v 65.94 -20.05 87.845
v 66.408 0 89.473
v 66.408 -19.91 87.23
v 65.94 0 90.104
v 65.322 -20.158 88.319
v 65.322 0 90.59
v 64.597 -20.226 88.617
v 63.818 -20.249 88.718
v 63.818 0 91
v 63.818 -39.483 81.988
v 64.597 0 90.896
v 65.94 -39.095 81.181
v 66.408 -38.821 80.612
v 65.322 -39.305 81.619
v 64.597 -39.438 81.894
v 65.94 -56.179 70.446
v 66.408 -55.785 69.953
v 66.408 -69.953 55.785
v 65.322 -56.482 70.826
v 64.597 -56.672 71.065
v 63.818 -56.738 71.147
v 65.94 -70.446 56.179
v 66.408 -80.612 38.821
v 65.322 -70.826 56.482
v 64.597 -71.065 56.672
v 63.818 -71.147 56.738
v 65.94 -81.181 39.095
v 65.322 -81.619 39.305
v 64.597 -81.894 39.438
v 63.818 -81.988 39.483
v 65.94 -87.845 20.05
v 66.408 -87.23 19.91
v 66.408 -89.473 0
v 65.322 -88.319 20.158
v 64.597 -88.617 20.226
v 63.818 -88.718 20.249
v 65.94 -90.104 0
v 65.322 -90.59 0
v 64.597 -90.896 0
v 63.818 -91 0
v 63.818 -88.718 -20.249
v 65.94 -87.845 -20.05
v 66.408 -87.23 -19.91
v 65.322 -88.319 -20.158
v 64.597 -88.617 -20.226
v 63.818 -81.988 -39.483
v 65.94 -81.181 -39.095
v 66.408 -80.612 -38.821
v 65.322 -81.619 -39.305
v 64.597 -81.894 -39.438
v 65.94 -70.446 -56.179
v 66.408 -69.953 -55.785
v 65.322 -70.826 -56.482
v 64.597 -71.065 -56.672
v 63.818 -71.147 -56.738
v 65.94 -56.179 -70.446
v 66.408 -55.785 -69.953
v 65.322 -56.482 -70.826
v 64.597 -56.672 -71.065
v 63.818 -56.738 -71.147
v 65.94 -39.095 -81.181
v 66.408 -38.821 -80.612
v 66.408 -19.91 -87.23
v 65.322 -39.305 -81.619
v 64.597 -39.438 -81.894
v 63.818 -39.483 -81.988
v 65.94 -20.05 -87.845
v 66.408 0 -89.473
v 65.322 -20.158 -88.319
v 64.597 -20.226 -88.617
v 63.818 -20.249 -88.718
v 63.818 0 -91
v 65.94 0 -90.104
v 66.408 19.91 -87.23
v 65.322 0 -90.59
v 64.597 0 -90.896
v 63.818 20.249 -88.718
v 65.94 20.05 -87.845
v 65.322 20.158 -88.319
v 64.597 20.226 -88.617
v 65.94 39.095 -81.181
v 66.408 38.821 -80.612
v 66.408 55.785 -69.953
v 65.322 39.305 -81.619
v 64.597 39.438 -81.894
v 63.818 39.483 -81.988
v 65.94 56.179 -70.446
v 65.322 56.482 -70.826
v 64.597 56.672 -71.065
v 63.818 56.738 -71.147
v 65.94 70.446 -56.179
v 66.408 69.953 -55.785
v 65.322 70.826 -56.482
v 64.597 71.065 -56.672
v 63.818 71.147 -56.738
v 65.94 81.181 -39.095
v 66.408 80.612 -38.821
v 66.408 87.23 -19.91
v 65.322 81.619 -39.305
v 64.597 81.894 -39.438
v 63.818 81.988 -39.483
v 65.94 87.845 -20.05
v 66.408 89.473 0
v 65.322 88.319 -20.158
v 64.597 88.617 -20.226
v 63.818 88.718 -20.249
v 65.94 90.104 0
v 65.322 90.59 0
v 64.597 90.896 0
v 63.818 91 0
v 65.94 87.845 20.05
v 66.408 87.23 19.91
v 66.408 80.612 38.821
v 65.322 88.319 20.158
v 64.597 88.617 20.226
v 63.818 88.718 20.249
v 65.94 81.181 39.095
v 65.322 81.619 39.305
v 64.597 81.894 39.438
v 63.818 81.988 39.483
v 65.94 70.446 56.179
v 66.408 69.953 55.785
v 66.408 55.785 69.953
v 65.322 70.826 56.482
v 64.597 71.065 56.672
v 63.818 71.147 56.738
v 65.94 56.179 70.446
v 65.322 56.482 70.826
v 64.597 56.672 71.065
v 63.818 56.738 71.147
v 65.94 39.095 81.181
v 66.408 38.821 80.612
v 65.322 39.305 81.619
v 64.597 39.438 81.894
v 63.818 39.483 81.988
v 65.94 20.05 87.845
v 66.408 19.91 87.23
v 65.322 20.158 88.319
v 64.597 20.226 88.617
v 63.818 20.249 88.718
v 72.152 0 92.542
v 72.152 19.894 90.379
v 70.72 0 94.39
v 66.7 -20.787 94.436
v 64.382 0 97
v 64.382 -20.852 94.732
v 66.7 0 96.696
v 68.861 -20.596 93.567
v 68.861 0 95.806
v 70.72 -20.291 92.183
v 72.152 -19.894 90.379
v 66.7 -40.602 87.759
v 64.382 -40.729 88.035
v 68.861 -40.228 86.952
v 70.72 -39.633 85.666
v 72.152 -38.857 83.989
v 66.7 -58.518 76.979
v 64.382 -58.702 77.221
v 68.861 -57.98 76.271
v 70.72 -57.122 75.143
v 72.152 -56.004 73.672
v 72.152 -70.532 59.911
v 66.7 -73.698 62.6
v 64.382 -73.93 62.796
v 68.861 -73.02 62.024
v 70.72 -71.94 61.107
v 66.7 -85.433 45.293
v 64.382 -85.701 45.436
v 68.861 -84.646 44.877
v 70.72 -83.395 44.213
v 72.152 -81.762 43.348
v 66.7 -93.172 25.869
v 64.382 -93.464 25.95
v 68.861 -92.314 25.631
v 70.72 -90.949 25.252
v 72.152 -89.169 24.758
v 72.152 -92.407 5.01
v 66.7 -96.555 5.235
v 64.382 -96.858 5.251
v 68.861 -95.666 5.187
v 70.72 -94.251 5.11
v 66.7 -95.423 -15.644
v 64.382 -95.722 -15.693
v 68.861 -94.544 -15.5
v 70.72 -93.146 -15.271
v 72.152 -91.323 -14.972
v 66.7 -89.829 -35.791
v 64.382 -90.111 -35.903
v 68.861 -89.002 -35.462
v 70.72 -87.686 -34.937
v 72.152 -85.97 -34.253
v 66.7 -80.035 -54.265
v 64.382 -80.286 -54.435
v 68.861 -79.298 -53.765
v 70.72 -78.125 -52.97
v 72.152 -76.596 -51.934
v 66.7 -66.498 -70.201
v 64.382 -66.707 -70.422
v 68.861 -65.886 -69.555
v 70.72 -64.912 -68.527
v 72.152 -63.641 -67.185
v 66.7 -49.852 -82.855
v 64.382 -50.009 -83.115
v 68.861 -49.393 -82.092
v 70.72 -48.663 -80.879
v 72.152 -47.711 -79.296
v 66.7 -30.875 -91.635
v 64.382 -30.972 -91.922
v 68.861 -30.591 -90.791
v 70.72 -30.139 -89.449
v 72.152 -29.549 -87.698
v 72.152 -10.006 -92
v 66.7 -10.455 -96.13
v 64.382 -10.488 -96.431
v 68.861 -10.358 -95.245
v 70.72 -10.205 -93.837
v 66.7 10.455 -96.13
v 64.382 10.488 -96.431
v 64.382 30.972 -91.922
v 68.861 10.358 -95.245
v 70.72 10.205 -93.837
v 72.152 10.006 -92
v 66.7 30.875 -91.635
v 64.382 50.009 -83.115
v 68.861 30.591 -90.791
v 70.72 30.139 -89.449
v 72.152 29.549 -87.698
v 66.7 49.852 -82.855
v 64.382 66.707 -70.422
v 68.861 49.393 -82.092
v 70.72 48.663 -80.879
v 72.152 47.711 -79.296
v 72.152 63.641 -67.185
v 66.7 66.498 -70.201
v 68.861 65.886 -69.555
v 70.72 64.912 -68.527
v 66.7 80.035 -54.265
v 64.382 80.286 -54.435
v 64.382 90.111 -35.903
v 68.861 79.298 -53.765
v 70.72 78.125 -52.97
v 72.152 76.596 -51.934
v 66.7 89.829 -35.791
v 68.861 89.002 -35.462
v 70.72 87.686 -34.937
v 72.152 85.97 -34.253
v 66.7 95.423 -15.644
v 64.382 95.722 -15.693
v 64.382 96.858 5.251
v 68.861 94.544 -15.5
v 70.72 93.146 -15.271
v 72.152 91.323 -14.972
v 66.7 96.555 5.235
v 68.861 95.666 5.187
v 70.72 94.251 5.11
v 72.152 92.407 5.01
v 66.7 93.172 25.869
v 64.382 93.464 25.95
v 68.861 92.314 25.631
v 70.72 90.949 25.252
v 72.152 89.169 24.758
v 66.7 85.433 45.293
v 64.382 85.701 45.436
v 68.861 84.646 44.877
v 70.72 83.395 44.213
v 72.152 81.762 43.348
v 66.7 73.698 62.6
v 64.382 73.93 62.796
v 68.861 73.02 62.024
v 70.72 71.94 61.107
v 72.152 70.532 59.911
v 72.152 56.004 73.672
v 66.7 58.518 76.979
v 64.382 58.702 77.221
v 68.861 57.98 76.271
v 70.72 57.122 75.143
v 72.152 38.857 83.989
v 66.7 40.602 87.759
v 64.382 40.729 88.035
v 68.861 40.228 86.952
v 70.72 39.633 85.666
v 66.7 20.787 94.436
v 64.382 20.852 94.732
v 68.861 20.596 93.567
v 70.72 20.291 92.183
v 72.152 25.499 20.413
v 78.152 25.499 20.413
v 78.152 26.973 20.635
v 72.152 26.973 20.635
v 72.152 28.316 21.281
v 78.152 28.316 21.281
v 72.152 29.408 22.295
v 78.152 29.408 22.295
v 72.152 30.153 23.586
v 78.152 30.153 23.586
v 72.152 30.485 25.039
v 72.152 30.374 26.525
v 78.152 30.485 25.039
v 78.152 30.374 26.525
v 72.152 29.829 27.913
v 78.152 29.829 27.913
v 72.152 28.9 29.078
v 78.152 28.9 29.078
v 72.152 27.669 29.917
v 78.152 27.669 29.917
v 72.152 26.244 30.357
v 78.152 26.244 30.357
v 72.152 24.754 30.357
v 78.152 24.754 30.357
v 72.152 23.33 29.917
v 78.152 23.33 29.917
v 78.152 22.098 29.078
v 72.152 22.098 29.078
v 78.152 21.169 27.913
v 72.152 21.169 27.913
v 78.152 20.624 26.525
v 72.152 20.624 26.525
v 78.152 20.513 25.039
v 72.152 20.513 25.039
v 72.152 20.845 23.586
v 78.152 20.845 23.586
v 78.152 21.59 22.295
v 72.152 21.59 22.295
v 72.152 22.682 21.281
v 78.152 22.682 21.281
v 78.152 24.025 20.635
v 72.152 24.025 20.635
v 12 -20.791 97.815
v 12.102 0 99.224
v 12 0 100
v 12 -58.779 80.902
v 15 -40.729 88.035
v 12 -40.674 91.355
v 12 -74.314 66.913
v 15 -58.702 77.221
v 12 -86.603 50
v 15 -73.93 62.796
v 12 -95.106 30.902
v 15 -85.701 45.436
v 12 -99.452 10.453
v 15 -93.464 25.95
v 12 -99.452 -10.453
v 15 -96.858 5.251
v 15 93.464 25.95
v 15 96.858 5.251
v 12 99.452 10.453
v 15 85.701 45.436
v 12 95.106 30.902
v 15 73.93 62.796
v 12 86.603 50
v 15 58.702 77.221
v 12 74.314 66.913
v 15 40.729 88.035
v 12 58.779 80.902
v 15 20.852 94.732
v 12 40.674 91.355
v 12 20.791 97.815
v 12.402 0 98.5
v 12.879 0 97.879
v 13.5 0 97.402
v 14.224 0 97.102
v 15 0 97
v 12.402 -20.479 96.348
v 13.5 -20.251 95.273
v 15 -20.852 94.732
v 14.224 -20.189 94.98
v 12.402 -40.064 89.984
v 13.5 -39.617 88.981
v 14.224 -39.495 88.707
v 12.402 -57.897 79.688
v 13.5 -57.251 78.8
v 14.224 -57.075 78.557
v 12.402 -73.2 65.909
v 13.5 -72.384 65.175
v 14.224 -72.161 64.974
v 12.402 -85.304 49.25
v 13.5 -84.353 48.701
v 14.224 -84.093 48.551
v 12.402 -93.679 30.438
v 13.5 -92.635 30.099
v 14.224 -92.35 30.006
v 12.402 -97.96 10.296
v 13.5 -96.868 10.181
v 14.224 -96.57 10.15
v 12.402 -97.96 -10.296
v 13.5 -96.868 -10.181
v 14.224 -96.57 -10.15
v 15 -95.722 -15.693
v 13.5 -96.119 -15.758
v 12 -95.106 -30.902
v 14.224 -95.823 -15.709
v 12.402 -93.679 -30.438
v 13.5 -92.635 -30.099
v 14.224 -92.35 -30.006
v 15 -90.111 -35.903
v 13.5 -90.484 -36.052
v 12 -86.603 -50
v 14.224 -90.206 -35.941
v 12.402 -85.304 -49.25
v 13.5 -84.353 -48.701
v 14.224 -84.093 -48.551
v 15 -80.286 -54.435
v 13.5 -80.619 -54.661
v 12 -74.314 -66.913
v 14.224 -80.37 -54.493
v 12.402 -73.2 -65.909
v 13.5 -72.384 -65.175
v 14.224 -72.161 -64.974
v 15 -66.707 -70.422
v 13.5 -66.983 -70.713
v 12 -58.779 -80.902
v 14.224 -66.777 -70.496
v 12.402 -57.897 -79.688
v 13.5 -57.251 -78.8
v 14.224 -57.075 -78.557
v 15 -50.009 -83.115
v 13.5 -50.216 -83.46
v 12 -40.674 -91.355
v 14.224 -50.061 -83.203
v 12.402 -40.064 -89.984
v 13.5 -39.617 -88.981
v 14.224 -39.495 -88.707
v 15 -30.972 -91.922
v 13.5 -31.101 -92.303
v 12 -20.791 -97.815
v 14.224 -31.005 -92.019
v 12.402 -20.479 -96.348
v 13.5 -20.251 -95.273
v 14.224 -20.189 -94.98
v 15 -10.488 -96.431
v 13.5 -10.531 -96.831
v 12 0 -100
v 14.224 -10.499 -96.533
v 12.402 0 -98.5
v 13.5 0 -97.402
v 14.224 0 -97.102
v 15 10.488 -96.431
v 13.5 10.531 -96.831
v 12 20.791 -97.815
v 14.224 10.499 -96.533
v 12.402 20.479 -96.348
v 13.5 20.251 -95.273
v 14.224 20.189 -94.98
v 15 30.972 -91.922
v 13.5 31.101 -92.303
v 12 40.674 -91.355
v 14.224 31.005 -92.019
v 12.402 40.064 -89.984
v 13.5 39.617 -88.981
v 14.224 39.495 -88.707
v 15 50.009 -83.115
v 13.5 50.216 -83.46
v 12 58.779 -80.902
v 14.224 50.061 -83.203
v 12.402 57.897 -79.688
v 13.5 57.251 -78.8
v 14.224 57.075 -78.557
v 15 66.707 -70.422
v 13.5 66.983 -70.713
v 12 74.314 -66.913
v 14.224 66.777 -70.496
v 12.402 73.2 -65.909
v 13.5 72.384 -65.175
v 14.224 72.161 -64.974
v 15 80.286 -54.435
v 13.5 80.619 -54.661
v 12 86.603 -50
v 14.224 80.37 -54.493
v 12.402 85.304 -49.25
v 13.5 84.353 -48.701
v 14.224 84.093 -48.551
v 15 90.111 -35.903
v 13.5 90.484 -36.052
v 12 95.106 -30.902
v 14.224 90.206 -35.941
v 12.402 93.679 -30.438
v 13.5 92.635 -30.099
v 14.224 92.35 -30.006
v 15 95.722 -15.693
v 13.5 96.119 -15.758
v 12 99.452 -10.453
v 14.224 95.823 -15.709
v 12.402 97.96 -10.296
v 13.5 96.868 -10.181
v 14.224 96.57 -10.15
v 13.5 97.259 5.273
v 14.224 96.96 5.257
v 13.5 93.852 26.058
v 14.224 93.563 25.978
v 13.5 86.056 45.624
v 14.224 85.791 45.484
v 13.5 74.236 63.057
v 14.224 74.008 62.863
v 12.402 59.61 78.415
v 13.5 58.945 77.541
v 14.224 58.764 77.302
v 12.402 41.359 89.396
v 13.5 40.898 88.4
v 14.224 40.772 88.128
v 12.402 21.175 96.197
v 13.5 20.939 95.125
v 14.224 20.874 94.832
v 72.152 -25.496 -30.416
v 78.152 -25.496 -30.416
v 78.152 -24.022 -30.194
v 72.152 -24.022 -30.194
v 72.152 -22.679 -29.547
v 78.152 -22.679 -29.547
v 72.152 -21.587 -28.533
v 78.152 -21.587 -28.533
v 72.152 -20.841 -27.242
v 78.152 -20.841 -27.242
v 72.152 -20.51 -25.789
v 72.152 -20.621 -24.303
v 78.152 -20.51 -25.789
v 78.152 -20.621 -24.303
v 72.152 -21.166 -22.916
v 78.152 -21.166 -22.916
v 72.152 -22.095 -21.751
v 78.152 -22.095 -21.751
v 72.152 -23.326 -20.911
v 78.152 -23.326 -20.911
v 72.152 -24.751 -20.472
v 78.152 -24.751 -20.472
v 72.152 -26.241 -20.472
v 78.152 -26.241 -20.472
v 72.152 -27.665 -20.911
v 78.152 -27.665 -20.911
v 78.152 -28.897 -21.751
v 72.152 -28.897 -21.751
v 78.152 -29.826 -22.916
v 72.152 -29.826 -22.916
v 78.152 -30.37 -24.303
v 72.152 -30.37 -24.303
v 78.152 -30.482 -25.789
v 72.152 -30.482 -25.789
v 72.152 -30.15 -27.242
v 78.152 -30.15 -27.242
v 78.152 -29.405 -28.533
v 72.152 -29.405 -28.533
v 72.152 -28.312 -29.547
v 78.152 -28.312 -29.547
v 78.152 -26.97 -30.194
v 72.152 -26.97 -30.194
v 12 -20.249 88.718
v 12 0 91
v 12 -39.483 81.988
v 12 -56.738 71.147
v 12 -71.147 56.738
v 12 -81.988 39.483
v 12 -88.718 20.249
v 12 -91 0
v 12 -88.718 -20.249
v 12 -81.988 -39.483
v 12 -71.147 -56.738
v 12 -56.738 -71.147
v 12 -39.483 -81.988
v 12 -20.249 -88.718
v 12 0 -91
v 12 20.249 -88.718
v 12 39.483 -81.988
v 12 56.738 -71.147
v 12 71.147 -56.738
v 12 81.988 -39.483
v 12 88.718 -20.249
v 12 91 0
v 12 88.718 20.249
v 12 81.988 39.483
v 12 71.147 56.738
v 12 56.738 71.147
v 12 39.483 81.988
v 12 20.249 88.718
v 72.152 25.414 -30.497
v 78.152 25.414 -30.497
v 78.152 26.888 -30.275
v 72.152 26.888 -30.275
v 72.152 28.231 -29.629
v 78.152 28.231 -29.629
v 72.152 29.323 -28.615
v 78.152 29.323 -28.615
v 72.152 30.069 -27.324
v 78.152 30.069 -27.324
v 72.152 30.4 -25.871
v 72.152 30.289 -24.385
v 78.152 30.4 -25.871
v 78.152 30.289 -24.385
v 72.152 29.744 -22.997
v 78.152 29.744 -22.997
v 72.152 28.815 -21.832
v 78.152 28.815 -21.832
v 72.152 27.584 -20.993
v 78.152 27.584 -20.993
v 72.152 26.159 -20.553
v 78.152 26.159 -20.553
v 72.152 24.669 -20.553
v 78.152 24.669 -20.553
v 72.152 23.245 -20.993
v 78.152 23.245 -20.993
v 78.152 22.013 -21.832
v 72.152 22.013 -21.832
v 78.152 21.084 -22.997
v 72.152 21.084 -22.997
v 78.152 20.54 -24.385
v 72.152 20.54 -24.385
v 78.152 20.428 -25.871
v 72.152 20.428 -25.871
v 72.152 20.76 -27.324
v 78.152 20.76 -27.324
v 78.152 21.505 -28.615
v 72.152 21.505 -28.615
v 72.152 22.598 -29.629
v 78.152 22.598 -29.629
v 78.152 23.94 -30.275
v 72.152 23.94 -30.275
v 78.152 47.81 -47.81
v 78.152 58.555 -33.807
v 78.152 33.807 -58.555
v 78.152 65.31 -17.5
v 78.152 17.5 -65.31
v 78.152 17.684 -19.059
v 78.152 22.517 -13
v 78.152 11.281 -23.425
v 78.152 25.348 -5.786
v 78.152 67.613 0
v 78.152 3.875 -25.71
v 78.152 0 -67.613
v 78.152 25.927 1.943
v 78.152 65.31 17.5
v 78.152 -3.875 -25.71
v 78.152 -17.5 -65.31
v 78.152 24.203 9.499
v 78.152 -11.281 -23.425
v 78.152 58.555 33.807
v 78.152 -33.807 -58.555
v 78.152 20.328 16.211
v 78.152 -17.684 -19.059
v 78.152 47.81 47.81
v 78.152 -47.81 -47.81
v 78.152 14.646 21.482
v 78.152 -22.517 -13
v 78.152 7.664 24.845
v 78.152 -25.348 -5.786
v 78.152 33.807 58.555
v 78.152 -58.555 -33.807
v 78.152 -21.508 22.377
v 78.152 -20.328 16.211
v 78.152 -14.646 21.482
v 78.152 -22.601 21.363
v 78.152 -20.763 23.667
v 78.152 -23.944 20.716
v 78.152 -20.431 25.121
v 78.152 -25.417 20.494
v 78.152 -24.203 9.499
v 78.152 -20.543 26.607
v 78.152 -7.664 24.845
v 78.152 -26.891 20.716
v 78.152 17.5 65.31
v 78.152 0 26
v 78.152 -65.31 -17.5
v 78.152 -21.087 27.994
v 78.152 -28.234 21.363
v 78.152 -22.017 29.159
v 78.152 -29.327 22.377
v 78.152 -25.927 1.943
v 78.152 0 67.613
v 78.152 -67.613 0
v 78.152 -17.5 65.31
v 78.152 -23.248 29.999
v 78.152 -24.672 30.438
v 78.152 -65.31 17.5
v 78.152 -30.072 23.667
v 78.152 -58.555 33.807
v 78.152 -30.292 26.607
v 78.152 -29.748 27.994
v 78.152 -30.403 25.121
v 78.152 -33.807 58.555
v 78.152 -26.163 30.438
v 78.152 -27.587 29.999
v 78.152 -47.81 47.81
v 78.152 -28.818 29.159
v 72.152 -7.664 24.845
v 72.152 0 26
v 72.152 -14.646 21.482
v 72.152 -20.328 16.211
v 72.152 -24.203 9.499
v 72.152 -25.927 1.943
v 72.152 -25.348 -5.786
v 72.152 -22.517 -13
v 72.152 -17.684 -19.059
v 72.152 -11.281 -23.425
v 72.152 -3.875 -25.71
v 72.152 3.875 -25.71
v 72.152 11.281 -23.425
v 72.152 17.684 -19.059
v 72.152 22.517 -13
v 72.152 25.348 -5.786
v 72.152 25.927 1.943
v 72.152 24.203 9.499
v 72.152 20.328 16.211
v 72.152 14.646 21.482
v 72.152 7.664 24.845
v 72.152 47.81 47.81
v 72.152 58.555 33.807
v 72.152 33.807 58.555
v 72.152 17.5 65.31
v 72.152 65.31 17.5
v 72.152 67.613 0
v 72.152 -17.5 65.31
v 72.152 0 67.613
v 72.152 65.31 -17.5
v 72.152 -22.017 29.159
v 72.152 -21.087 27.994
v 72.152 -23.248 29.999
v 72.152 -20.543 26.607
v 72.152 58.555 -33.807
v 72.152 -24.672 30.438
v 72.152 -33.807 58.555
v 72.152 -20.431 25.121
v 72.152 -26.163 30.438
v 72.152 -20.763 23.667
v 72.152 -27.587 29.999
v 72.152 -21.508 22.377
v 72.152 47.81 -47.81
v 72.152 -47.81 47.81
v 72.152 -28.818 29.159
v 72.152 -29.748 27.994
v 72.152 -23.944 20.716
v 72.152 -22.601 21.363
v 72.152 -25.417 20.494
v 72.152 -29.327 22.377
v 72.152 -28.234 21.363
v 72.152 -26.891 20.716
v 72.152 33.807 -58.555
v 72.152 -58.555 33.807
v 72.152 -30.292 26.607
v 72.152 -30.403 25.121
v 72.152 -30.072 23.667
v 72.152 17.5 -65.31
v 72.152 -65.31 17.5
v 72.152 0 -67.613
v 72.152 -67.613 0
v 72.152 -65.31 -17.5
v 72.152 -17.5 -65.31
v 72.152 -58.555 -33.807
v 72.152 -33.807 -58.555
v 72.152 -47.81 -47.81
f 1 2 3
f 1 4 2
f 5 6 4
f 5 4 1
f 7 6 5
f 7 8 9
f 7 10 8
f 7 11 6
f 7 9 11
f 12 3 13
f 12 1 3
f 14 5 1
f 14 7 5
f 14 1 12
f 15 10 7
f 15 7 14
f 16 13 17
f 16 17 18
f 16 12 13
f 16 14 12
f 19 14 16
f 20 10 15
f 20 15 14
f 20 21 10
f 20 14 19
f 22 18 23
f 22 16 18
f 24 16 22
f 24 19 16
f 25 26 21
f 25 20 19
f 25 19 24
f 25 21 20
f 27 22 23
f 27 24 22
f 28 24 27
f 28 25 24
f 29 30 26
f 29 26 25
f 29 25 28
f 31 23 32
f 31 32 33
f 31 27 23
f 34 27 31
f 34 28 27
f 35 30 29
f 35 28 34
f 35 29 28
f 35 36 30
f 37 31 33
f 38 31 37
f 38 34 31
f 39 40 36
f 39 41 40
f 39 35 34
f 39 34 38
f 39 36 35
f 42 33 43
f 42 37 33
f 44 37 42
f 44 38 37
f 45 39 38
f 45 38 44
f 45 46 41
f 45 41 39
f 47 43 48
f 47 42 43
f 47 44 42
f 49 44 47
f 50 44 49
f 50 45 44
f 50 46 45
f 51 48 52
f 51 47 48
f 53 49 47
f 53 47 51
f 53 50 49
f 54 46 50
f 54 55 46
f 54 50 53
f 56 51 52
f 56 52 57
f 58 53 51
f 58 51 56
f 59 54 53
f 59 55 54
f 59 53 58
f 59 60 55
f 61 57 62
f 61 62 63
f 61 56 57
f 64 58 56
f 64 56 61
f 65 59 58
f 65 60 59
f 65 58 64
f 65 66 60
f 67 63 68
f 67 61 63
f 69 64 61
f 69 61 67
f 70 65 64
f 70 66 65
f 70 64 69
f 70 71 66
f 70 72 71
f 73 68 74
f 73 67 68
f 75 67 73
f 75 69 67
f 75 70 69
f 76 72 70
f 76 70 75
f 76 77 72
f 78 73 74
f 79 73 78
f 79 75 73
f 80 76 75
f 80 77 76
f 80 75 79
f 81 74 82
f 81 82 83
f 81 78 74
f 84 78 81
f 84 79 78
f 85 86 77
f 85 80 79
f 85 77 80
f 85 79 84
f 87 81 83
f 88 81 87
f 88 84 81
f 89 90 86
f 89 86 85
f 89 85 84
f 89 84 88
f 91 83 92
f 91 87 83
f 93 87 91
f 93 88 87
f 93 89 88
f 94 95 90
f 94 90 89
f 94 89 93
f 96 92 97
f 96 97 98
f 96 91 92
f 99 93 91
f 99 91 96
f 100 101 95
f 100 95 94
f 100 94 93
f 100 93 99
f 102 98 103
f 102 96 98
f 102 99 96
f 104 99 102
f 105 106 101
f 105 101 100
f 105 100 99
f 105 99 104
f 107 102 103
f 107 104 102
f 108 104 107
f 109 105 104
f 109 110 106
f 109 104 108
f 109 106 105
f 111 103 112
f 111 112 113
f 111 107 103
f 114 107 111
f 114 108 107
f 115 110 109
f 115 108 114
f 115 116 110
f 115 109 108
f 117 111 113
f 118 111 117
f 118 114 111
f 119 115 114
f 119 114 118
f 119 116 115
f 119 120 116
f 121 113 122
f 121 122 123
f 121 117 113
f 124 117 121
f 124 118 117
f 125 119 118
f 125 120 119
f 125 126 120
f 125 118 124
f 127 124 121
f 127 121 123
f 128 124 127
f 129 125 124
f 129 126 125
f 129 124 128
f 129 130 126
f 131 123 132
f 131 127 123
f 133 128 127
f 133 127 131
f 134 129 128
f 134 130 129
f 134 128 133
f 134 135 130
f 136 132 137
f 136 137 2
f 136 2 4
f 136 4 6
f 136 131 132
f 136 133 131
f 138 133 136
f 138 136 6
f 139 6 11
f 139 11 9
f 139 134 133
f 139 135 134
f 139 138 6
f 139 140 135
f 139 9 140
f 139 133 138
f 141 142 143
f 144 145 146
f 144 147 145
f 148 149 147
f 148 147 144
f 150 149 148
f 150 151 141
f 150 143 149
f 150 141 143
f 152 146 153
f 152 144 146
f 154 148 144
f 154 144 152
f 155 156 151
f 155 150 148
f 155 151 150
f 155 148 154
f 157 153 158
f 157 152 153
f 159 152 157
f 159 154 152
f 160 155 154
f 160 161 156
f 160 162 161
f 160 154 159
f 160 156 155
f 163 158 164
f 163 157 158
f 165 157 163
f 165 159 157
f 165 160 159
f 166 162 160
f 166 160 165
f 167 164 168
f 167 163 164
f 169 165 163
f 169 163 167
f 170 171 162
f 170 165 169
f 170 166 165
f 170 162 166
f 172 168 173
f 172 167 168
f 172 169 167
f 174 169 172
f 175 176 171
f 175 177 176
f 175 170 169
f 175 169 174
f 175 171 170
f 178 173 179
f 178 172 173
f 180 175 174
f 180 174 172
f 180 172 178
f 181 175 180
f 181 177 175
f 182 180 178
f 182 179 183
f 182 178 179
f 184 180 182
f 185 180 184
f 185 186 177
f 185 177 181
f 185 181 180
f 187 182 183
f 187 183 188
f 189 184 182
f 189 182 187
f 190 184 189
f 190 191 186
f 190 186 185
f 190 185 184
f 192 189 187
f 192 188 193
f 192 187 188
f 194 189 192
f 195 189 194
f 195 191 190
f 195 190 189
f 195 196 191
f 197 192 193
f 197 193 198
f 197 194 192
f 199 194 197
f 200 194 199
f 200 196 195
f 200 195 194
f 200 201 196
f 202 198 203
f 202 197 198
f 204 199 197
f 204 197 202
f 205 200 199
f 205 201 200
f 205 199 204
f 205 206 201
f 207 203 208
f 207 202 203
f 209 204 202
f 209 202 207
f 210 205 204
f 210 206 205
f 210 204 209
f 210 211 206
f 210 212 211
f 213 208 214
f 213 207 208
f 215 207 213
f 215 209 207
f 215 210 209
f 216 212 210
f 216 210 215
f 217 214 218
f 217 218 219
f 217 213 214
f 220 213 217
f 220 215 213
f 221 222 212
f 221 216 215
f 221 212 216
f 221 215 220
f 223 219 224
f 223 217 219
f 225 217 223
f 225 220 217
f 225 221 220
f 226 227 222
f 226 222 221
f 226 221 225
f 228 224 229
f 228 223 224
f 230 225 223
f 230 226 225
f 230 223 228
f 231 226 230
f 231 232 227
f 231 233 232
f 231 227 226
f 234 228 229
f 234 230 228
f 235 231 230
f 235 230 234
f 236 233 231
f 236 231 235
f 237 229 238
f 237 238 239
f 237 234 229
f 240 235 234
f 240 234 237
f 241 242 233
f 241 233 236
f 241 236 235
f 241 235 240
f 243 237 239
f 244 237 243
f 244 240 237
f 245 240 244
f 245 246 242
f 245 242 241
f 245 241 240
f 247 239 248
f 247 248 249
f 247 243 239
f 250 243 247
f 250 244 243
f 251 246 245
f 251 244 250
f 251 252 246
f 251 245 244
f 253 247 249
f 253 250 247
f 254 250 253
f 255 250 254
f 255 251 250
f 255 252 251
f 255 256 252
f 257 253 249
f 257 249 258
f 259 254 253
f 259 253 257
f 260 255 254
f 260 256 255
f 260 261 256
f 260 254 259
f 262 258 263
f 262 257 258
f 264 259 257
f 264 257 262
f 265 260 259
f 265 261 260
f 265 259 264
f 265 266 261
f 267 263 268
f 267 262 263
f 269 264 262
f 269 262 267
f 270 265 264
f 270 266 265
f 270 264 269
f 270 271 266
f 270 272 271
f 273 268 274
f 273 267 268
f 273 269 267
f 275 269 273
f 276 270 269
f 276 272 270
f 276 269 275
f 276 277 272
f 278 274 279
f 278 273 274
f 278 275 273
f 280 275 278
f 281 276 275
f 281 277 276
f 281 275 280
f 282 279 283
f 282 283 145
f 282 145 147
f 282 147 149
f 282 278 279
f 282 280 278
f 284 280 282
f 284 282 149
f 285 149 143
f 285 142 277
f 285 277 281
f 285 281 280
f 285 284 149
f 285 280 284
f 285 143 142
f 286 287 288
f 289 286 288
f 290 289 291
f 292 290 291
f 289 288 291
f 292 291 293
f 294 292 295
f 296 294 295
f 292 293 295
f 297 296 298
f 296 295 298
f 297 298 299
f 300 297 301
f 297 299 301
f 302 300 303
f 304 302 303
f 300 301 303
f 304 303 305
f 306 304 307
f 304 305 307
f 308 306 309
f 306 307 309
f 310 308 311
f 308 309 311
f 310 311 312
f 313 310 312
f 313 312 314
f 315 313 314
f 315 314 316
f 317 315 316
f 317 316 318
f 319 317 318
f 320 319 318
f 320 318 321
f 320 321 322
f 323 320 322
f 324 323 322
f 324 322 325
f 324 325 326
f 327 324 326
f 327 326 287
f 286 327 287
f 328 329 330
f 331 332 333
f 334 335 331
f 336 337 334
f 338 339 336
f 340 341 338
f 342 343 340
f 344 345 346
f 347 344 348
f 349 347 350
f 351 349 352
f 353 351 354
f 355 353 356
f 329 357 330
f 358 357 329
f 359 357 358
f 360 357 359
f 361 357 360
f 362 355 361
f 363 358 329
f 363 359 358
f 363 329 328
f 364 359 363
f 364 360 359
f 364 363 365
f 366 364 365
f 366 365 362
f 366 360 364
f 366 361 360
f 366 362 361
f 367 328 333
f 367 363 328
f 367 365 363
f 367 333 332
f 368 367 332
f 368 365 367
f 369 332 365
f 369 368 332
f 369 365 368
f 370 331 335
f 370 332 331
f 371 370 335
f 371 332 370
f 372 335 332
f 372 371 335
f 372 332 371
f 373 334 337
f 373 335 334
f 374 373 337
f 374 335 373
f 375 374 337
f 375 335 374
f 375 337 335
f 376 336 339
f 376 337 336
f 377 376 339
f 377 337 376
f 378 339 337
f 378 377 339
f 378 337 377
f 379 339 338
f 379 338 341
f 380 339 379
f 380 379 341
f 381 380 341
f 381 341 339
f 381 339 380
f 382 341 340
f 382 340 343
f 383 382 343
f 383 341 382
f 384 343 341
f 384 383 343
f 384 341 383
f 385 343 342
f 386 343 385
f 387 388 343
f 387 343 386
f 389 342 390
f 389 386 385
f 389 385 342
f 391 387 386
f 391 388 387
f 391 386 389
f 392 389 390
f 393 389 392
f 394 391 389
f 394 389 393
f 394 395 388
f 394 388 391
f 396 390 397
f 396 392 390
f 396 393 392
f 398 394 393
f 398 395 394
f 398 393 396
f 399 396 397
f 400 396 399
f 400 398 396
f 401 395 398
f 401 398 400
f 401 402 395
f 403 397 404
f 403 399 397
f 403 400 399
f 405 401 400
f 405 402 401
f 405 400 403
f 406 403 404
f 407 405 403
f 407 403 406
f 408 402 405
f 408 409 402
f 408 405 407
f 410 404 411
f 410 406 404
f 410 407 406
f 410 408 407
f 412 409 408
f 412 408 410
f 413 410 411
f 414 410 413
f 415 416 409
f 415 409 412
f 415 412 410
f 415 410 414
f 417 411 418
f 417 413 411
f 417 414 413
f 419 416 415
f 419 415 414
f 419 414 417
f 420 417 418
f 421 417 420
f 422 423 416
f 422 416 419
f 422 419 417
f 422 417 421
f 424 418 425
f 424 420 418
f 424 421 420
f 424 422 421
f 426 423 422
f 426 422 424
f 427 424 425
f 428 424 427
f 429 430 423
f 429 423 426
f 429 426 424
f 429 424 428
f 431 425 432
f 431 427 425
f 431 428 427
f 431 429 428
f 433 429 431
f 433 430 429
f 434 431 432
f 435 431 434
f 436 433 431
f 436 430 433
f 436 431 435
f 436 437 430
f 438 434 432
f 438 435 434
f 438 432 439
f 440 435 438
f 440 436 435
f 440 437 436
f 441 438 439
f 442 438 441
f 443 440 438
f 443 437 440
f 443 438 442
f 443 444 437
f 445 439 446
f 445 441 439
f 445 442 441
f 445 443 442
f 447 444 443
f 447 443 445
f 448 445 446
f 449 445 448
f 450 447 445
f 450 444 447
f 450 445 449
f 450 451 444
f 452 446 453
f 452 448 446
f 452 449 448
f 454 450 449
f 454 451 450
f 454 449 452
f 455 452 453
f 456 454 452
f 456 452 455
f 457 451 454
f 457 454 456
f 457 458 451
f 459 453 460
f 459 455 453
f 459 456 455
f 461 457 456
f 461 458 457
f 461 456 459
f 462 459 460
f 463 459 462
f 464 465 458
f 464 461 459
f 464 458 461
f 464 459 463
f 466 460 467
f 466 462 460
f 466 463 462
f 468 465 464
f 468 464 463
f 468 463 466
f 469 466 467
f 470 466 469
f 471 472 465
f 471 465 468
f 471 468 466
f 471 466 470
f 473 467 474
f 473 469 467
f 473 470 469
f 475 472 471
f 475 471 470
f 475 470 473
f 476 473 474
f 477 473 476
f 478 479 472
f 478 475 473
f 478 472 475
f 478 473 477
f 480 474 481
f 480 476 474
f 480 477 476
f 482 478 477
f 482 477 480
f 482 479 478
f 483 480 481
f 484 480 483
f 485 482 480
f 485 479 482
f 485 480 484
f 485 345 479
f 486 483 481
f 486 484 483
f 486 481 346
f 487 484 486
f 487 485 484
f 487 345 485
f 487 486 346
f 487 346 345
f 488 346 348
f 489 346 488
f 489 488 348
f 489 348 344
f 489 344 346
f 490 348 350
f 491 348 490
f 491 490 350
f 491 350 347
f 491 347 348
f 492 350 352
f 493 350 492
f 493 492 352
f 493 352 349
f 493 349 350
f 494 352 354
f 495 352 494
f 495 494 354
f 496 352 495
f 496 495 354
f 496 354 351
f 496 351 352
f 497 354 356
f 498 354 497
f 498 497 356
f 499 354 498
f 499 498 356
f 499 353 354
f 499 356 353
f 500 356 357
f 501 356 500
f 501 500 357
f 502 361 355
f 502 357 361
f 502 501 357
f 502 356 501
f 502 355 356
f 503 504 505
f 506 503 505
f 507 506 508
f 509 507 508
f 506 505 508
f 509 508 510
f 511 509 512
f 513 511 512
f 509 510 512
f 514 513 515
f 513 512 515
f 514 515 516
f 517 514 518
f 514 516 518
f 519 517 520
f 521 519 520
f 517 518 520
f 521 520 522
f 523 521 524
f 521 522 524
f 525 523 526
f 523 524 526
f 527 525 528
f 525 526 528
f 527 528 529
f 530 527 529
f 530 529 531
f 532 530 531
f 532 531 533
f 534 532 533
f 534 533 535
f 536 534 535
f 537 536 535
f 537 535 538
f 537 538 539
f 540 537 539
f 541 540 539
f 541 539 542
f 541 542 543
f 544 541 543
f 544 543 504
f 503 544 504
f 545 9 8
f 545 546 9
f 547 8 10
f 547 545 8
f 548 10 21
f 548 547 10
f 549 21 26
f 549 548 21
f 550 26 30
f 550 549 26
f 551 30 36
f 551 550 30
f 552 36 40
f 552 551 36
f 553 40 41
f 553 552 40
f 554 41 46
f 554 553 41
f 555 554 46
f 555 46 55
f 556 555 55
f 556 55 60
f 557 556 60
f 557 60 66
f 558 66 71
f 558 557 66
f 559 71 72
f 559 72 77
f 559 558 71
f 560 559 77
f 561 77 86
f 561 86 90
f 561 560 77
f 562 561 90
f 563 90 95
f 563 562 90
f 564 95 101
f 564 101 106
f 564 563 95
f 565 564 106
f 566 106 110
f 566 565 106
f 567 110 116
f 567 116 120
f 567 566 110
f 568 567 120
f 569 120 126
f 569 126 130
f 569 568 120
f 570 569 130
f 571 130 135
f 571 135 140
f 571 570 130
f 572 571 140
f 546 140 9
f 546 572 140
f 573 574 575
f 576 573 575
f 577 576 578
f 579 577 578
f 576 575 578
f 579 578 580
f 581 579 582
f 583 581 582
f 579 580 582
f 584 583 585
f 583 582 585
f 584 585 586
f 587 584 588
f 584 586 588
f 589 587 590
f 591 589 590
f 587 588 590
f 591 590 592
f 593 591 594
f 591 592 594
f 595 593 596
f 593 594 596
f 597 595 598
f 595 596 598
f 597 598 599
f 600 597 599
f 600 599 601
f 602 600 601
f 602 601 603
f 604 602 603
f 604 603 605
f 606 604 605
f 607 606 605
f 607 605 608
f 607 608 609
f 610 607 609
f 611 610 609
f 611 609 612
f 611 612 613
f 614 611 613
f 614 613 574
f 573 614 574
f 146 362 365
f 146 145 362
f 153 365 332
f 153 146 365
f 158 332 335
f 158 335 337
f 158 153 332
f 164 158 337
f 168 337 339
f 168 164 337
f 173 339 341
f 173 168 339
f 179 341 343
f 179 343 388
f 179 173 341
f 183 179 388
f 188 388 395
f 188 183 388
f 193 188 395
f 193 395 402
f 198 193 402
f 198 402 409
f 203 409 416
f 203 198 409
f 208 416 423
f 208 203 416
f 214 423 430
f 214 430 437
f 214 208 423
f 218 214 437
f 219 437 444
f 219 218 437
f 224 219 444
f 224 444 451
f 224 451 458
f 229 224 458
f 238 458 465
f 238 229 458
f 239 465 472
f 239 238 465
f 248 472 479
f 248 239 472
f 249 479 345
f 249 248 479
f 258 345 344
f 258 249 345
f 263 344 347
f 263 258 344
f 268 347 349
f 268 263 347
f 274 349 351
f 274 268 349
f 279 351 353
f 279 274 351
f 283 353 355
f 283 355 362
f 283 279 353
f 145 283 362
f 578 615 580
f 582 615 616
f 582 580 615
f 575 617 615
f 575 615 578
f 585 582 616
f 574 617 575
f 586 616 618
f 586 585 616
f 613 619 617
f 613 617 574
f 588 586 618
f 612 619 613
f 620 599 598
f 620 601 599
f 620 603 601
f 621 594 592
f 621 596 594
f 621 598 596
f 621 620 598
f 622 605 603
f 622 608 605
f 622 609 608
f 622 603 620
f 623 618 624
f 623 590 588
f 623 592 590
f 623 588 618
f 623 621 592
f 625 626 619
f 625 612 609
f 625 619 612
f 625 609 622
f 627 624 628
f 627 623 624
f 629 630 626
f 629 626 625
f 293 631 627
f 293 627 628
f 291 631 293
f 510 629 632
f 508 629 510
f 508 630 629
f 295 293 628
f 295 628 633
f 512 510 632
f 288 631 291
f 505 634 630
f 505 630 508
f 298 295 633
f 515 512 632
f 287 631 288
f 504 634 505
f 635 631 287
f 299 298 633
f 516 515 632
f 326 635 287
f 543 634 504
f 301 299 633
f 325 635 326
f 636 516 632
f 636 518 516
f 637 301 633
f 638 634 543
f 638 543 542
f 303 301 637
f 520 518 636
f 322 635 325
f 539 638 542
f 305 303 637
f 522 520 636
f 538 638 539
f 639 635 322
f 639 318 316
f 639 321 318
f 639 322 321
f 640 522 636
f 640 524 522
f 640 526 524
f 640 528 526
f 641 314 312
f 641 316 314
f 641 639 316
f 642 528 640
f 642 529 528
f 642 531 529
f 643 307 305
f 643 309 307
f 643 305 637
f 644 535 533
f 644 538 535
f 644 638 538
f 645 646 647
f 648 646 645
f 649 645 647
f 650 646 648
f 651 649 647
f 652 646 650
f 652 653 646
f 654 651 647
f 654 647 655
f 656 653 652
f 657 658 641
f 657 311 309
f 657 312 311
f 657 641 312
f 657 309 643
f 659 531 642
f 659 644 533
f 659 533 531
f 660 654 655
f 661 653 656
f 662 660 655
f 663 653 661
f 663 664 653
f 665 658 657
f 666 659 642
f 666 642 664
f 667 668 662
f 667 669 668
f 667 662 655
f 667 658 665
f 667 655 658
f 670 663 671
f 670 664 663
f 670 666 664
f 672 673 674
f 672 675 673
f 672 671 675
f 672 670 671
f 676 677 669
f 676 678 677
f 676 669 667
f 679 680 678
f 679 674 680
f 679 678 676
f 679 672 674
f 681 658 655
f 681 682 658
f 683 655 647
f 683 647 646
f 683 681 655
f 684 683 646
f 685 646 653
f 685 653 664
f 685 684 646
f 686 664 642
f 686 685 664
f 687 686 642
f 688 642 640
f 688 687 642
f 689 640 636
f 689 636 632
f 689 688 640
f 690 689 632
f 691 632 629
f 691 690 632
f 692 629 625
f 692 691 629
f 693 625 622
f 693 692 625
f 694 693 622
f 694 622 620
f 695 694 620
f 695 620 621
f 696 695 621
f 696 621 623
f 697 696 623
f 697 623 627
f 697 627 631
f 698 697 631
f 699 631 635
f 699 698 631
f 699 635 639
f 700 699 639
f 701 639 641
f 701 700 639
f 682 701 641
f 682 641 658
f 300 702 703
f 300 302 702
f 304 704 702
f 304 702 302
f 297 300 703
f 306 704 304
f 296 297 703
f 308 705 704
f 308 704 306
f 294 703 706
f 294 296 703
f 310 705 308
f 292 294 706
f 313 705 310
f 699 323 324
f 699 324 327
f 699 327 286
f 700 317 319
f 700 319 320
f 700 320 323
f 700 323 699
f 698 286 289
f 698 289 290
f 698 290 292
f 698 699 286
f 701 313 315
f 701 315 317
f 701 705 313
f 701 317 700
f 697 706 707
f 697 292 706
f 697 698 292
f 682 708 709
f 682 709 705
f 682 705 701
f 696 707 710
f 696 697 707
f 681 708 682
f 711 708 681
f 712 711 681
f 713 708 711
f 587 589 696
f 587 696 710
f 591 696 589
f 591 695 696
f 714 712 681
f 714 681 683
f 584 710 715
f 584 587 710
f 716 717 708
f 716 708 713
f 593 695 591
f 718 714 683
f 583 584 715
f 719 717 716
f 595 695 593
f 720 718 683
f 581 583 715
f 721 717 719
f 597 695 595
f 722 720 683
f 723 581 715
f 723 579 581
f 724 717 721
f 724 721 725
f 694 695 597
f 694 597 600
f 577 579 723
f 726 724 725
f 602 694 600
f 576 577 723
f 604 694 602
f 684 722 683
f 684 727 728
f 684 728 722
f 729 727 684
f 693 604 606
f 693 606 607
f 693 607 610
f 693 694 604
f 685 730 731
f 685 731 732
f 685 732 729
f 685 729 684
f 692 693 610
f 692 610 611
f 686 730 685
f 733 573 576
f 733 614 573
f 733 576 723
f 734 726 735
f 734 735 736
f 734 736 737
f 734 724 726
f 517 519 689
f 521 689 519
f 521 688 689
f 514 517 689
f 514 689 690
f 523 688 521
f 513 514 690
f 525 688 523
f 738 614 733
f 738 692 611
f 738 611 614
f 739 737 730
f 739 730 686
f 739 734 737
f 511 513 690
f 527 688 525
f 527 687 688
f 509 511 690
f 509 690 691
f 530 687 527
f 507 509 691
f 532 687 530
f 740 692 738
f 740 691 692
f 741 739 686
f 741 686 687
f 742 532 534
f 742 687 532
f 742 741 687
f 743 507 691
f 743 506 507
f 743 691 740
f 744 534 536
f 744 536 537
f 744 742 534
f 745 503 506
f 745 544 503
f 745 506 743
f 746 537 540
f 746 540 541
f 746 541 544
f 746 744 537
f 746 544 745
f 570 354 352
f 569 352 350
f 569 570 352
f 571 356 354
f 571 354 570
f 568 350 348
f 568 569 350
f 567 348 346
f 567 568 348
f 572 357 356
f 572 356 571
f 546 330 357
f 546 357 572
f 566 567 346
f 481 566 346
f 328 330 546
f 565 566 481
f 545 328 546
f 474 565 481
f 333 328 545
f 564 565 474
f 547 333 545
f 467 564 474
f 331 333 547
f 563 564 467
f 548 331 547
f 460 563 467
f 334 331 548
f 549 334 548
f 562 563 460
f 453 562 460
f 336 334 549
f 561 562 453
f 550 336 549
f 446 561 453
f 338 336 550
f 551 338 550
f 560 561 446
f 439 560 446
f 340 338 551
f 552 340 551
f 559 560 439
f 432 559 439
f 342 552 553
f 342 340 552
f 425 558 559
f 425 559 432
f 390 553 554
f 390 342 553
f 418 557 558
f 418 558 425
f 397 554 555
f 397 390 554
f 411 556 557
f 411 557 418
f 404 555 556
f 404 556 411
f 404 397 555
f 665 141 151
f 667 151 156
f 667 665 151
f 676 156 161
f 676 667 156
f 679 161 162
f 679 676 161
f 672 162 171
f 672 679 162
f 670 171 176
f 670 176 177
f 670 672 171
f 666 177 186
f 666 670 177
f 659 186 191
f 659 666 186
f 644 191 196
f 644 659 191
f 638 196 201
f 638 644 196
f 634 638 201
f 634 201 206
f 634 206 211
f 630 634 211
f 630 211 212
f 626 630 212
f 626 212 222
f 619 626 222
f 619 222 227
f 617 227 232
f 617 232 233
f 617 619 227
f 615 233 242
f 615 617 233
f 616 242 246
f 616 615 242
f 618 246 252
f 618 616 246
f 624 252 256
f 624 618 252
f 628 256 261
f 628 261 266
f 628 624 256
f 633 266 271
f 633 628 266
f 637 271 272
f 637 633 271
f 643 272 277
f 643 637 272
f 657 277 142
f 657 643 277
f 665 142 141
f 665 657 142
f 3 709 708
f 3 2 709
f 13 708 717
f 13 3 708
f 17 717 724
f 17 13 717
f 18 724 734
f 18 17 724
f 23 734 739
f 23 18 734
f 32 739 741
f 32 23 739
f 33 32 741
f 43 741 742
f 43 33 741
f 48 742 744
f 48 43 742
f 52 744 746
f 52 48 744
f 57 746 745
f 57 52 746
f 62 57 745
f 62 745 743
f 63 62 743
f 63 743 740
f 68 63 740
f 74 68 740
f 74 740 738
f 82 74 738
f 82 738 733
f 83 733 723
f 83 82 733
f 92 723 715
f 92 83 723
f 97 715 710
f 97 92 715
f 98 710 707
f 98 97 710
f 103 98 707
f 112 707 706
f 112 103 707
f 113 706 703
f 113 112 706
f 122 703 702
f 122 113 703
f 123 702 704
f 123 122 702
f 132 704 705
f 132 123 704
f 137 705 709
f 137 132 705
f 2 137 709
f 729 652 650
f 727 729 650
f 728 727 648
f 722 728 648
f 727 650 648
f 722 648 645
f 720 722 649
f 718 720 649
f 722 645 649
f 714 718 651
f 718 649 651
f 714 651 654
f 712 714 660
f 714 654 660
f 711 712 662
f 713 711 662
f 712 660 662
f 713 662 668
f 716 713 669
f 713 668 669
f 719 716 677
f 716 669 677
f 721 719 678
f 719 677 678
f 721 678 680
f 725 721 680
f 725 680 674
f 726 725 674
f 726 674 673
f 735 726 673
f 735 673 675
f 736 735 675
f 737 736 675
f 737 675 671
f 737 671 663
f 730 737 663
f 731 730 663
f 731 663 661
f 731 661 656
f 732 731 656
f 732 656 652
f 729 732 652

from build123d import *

# Parameters (mm, degrees)
SKETCH2_R          = 5
CUT_EXTRUDE1_DEPTH = 10


with BuildPart() as part:
    # Sketch1 → Revolve1 (revolve)
    with BuildSketch(Plane.XY, mode=Mode.PRIVATE) as revolve1_sk:
        with BuildLine():
            Line((15, 97), (60.316020873, 97))
            Line((60.316020873, 97), (64.382402521, 97))
            ThreePointArc((64.382402521, 97), (68.861218013, 95.806421189), (72.152073668, 92.542269286))
            Line((72.152073668, 92.542269286), (78.152073668, 67.613382081))
            Line((78.152073668, 67.613382081), (78.152073668, 26))
            Line((78.152073668, 26), (72.152073668, 26))
            Line((72.152073668, 26), (72.152073668, 67.613382081))
            Line((72.152073668, 67.613382081), (66.408193592, 89.472988604))
            ThreePointArc((66.408193592, 89.472988604), (65.32157431, 90.589825828), (63.81830321, 91))
            Line((63.81830321, 91), (12, 91))
            Line((12, 91), (12, 100))
            ThreePointArc((12, 100), (12.878679656, 97.878679656), (15, 97))
        make_face()
    revolve(revolve1_sk.sketch.rotate(Axis((-30.728161887, 0, 0), (1, 0, 0)), 90), axis=Axis((-30.728161887, 0, 0), (1, 0, 0)))

    # Sketch2 → Cut-Extrude1 (cut)
    with BuildSketch(Plane(origin=(78.152073668, 0, 0), x_dir=(0, 0, -1), z_dir=(1, 0, 0))):
        with Locations((-25.412524086, 25.499090564)):
            Circle(SKETCH2_R)
        with Locations((25.497475914, 25.414144133)):
            Circle(SKETCH2_R)
        with Locations((25.415769388, -25.495855867)):
            Circle(SKETCH2_R)
        with Locations((-25.494170251, -25.417460204)):
            Circle(SKETCH2_R)
    extrude(amount=-CUT_EXTRUDE1_DEPTH, mode=Mode.SUBTRACT)


solid = part.part
